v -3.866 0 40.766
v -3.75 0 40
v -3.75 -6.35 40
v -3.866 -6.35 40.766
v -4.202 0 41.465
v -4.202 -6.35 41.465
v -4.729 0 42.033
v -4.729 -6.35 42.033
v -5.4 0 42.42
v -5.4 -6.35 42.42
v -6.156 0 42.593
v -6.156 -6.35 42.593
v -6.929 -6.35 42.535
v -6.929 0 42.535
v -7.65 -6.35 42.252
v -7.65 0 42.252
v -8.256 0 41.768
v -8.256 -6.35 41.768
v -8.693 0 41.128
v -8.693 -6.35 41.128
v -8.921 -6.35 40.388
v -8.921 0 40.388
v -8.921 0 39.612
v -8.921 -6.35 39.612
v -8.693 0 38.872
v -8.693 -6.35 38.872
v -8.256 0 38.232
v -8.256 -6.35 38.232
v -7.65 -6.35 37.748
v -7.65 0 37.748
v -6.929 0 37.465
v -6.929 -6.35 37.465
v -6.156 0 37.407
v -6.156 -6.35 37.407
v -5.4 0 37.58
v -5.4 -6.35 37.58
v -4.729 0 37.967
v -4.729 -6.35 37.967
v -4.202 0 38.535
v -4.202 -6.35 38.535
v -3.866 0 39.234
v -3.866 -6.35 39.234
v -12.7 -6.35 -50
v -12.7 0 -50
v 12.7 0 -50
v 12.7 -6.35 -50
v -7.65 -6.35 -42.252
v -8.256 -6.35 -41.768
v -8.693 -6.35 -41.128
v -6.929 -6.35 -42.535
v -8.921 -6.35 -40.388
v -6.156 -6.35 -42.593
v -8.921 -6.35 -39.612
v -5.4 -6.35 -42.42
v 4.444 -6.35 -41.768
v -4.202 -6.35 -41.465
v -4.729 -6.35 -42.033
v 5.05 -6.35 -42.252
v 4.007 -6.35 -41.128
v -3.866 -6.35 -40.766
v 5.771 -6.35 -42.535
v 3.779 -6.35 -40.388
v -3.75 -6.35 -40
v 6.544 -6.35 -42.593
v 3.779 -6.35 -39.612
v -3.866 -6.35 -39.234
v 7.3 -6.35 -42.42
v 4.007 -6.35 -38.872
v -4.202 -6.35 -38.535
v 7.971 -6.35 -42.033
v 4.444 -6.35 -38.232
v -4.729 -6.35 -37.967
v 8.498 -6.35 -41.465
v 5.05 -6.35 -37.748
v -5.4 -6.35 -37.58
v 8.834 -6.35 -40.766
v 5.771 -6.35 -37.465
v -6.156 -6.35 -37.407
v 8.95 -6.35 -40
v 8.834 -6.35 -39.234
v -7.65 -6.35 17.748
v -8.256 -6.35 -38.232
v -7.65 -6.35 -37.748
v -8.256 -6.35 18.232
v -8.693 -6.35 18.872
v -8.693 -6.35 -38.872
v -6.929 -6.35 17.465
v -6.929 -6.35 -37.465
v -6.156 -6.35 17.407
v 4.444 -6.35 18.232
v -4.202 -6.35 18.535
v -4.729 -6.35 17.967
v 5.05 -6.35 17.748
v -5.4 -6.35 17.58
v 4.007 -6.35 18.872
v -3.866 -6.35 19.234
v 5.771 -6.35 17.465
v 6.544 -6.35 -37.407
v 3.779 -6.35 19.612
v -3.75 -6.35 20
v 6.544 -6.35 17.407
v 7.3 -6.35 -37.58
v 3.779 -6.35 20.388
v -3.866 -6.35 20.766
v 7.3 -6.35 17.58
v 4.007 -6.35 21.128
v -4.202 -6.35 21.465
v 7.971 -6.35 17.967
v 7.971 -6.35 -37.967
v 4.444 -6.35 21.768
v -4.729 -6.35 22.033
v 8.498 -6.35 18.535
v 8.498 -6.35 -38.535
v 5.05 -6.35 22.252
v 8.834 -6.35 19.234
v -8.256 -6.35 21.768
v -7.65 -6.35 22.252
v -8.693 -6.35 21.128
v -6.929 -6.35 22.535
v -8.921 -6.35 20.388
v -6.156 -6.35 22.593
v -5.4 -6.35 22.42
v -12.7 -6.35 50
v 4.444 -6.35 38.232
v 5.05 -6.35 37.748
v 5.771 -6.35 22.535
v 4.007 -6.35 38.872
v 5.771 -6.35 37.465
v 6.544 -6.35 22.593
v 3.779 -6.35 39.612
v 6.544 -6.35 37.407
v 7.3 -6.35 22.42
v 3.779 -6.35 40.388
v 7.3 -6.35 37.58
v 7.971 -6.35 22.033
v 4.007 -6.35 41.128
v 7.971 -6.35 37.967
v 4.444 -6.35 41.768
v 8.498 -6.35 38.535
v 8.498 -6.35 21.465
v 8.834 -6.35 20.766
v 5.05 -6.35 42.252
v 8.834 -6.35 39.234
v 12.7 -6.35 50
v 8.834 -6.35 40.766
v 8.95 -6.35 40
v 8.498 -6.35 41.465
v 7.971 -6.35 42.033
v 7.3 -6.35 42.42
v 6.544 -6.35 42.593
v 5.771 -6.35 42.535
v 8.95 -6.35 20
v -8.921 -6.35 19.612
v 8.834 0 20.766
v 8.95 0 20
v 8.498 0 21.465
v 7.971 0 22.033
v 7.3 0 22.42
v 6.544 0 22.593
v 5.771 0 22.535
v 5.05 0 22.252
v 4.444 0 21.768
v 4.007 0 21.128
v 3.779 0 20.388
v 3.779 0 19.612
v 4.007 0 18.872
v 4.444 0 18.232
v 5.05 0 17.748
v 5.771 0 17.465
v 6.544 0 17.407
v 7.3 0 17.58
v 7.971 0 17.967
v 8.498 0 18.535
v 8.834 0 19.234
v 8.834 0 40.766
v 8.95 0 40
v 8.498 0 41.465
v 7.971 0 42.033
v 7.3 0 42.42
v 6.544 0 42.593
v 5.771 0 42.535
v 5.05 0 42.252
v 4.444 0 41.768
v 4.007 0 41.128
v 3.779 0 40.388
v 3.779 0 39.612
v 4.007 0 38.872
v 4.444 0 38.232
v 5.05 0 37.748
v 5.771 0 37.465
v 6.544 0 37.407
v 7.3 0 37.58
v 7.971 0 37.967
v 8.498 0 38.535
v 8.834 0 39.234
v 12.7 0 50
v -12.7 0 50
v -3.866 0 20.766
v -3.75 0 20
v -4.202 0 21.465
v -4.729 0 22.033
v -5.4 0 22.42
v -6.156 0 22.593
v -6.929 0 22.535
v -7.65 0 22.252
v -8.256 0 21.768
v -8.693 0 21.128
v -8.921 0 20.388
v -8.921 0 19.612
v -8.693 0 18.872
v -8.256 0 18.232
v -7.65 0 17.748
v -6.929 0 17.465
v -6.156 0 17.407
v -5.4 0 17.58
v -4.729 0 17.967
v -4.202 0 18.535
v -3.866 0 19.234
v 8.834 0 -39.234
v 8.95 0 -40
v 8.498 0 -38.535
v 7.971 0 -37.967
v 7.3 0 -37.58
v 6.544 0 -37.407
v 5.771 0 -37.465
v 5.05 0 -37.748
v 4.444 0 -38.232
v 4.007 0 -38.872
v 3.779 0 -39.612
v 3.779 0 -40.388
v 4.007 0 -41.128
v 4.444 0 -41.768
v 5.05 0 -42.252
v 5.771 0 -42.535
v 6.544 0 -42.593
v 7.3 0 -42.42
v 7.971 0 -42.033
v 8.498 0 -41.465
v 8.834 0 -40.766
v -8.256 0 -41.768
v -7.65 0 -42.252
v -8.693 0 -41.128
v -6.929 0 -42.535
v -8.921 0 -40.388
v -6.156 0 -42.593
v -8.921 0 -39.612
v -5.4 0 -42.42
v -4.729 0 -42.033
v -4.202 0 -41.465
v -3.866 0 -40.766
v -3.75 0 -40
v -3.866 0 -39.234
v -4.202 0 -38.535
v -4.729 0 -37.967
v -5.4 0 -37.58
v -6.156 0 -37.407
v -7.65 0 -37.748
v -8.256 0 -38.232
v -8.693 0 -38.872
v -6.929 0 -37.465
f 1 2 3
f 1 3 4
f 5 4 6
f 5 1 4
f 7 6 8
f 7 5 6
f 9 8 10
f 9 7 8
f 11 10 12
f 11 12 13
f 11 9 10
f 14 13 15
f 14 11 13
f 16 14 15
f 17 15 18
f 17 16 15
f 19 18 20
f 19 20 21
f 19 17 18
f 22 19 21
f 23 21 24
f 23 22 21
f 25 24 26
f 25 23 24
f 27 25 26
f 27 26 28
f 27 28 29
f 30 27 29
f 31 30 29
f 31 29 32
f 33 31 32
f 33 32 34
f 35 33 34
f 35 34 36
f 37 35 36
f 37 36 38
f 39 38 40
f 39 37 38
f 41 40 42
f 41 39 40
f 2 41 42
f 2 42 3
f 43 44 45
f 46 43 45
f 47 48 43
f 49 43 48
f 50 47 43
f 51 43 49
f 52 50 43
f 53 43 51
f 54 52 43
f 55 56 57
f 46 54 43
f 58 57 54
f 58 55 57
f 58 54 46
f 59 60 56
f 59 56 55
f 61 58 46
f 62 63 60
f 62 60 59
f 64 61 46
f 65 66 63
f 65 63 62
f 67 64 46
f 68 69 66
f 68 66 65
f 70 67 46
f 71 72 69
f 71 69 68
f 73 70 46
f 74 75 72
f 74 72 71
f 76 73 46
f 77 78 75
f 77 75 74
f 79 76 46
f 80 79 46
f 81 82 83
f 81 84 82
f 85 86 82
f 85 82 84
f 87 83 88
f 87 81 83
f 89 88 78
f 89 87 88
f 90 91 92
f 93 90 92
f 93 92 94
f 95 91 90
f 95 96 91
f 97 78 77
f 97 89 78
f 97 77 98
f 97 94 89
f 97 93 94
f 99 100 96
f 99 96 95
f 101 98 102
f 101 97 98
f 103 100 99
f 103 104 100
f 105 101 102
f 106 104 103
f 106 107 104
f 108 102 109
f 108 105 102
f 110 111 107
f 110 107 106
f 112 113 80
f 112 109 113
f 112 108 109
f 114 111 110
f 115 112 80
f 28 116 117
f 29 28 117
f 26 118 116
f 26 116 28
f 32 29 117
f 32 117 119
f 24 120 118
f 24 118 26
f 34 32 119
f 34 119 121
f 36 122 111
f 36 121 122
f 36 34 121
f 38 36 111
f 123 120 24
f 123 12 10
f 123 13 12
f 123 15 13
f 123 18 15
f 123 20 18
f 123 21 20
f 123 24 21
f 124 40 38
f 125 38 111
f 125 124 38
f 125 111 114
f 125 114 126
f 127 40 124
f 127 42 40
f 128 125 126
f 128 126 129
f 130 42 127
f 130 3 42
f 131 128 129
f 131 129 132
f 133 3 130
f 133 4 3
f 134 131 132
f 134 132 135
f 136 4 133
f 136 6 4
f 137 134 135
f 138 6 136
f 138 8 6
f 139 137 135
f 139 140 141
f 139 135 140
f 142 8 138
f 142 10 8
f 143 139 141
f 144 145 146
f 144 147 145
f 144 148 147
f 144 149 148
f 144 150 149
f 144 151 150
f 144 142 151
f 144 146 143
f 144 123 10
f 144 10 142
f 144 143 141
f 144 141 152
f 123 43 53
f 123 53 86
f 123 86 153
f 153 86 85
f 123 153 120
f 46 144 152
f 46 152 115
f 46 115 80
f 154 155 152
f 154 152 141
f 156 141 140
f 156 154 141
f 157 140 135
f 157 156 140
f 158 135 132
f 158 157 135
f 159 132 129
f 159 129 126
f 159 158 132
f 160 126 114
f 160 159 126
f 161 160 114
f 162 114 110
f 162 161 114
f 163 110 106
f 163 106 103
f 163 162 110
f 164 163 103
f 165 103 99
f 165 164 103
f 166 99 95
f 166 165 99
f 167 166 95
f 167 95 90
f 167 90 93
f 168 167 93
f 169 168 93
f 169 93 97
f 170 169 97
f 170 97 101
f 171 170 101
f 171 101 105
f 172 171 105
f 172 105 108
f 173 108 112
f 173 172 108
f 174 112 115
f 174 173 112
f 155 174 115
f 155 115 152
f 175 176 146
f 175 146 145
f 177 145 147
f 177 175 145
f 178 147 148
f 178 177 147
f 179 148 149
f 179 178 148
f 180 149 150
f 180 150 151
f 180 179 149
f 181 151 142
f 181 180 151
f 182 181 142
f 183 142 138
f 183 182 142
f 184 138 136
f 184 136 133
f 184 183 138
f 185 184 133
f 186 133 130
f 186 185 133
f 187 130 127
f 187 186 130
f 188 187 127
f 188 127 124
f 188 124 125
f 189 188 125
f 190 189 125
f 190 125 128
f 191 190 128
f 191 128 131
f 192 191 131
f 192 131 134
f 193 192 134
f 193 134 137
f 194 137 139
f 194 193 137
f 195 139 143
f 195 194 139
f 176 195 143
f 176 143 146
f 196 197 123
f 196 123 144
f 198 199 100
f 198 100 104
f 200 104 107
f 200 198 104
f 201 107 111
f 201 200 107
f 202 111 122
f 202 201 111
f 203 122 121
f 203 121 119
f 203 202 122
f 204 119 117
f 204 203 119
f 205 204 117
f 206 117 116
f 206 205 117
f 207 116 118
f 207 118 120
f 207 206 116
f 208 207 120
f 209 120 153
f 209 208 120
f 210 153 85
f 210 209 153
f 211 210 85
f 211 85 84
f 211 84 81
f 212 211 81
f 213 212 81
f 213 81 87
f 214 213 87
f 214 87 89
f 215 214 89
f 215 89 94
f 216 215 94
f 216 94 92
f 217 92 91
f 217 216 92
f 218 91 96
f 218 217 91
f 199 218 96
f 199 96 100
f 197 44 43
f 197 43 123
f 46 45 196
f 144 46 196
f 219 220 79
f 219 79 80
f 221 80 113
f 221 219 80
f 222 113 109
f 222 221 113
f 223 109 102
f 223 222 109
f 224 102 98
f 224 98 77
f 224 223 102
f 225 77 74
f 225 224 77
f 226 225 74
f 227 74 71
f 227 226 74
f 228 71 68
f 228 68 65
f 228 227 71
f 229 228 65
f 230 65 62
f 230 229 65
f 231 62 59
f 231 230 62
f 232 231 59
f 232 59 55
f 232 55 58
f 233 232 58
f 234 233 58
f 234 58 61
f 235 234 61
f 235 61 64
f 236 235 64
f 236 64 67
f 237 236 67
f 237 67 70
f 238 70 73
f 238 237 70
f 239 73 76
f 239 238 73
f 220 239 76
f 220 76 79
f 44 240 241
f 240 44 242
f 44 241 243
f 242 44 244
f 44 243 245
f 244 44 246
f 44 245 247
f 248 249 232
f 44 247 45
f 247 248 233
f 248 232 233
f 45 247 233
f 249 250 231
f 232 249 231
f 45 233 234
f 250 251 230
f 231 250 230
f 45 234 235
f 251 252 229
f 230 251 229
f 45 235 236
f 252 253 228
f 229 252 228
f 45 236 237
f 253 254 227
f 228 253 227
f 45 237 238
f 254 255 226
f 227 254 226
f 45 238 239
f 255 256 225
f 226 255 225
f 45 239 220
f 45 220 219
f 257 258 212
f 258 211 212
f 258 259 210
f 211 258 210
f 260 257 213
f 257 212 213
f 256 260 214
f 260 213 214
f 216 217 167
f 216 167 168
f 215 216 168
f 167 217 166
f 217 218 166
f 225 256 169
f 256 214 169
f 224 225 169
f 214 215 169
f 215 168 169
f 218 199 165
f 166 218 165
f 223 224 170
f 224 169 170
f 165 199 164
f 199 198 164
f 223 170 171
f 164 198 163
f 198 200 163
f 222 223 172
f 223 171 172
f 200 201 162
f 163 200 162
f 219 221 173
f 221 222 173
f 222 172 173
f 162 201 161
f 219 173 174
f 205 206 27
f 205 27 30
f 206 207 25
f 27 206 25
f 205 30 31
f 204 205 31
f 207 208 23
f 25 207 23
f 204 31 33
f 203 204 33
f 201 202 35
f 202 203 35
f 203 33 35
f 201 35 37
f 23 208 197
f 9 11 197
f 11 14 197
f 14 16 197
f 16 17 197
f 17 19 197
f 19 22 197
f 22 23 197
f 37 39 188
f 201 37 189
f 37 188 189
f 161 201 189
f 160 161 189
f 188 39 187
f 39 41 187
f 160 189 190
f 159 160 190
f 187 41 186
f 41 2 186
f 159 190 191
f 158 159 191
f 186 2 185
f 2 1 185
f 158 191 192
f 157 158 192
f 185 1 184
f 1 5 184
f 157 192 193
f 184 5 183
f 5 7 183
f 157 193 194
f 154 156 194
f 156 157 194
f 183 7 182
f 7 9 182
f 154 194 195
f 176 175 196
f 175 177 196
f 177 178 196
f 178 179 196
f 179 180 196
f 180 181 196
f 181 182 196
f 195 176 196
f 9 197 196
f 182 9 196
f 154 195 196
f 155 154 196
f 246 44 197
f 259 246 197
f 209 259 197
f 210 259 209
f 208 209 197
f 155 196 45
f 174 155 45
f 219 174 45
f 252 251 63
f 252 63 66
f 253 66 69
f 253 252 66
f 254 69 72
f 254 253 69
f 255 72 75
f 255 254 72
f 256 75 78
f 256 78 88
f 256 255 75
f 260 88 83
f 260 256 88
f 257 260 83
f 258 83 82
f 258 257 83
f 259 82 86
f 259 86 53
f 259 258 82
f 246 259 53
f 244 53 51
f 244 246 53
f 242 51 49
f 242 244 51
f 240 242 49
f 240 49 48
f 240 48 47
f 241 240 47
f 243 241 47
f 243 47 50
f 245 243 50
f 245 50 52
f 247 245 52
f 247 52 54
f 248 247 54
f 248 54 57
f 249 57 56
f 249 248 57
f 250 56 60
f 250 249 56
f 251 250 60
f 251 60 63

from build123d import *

# Parameters (mm, degrees)
F0_W     = 25.4
F0_H     = 100
F0_R     = 2.6
F1_DEPTH = 6.35


with BuildPart() as f1:
    # F0 (on Front) → F1 (new body)
    with BuildSketch(Plane.XZ):
        Rectangle(F0_W, F0_H)
        with Locations((-6.35, -40)):
            Circle(F0_R, mode=Mode.SUBTRACT)
        with Locations((6.35, -40)):
            Circle(F0_R, mode=Mode.SUBTRACT)
        with Locations((-6.35, 20)):
            Circle(F0_R, mode=Mode.SUBTRACT)
        with Locations((-6.35, 40)):
            Circle(F0_R, mode=Mode.SUBTRACT)
        with Locations((6.35, 20)):
            Circle(F0_R, mode=Mode.SUBTRACT)
        with Locations((6.35, 40)):
            Circle(F0_R, mode=Mode.SUBTRACT)
    extrude(amount=F1_DEPTH)


solid = f1.part
